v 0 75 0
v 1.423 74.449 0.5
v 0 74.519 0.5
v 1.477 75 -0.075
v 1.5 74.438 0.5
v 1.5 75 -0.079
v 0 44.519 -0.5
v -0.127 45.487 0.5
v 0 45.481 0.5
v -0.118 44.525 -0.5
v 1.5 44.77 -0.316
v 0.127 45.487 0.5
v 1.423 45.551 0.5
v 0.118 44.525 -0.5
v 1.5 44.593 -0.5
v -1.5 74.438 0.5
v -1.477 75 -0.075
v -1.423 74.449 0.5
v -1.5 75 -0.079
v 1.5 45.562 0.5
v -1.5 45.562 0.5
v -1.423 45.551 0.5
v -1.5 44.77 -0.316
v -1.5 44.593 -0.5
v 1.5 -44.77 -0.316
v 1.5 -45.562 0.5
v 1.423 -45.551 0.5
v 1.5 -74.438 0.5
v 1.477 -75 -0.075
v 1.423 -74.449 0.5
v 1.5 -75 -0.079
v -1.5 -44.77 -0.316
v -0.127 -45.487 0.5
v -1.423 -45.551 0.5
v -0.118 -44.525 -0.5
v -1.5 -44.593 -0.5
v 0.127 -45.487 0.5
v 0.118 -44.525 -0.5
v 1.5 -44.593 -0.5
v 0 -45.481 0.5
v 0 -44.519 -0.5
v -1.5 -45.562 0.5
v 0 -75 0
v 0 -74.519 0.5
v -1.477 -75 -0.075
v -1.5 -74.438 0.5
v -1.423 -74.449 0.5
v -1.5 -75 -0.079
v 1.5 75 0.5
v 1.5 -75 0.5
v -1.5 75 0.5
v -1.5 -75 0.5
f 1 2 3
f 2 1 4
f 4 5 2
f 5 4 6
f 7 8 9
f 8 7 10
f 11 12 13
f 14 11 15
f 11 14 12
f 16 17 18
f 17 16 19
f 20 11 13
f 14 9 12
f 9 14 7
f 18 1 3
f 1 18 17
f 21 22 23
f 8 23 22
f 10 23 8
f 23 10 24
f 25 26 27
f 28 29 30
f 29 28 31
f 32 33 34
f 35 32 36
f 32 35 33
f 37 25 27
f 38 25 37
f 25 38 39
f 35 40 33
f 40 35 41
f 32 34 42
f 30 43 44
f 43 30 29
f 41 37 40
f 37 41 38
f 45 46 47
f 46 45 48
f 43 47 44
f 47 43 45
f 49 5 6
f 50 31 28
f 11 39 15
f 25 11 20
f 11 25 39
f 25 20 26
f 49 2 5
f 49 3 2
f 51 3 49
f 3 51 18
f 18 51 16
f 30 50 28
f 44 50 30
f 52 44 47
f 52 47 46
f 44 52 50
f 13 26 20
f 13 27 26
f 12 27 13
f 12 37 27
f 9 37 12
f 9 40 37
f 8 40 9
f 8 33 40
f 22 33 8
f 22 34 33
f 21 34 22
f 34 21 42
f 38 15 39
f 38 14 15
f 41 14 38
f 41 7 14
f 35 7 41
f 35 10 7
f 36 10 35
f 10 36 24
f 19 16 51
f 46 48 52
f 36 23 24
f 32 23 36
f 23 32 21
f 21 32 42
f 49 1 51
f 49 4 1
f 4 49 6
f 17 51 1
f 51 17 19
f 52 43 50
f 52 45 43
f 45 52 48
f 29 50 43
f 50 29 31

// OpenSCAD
// file: plate_twin_lasers.scad
$fn=64;

plate_depth_new = 2.8;
plate_len=120;
plate_width=33;

module plate(plate_depth) {
    difference(){
        base(plate_depth);
        holes();
        }
      }
      
module holes(){
    translate([0,-plate_len/2,1])
    cylinder(h=40,d=6.5,center=true);
    translate([0,plate+len/2,0])
    cylinder(h=40,d=6.5,center=true);
}
 module base(plate_depth){
     cube([plate_width,plate_len,plate_depth],center=true);
     color("red")
     translate([0,-plate_len/2,0])
     cylinder(h=plate_depth,d=plate_width,center=true);
     color("green")
     translate([0,plate_len/2,0])
     cylinder(h=plate_depth,d=plate_width,center=true);
     }    
// main file
include<plate_twin_lasers.scad>

difference(){
    rib_center(rib_depth=3,rib_heiht=25);
    holes();
    }

module holes(){
    translate([0,plate_len/2])
    cylinder(d1=55,d2=5,h=25+1,center=true);
    translate([0,-plate_len/2])
    cylinder(d1=55,d2=5,h=25+1,center=true);
    }
    
module rib_center(rib_depth,rib_height) {
    cube([rib_depth,150,rib_height],center=true);
    }
    
module rib(rib_depth,rib_height){
    difference(){
        plate(plate_depth=rib_height);
        translate([0,0,0])
        cube([plate_width-rib_depth,plate_len,rib_height+1],center=true);
        color("red")
        translate([0,-plate_len/2,0])
        cylinder(h=rib_height+1, d=plate_width-rib_depth,center=true);
        color("green")
        translate([0,plate_len/2,0])
        cylinder(h=rib_height+1, d=plate_width-rib_depth,center=true);
        }
    
    
    
    
    
    }
